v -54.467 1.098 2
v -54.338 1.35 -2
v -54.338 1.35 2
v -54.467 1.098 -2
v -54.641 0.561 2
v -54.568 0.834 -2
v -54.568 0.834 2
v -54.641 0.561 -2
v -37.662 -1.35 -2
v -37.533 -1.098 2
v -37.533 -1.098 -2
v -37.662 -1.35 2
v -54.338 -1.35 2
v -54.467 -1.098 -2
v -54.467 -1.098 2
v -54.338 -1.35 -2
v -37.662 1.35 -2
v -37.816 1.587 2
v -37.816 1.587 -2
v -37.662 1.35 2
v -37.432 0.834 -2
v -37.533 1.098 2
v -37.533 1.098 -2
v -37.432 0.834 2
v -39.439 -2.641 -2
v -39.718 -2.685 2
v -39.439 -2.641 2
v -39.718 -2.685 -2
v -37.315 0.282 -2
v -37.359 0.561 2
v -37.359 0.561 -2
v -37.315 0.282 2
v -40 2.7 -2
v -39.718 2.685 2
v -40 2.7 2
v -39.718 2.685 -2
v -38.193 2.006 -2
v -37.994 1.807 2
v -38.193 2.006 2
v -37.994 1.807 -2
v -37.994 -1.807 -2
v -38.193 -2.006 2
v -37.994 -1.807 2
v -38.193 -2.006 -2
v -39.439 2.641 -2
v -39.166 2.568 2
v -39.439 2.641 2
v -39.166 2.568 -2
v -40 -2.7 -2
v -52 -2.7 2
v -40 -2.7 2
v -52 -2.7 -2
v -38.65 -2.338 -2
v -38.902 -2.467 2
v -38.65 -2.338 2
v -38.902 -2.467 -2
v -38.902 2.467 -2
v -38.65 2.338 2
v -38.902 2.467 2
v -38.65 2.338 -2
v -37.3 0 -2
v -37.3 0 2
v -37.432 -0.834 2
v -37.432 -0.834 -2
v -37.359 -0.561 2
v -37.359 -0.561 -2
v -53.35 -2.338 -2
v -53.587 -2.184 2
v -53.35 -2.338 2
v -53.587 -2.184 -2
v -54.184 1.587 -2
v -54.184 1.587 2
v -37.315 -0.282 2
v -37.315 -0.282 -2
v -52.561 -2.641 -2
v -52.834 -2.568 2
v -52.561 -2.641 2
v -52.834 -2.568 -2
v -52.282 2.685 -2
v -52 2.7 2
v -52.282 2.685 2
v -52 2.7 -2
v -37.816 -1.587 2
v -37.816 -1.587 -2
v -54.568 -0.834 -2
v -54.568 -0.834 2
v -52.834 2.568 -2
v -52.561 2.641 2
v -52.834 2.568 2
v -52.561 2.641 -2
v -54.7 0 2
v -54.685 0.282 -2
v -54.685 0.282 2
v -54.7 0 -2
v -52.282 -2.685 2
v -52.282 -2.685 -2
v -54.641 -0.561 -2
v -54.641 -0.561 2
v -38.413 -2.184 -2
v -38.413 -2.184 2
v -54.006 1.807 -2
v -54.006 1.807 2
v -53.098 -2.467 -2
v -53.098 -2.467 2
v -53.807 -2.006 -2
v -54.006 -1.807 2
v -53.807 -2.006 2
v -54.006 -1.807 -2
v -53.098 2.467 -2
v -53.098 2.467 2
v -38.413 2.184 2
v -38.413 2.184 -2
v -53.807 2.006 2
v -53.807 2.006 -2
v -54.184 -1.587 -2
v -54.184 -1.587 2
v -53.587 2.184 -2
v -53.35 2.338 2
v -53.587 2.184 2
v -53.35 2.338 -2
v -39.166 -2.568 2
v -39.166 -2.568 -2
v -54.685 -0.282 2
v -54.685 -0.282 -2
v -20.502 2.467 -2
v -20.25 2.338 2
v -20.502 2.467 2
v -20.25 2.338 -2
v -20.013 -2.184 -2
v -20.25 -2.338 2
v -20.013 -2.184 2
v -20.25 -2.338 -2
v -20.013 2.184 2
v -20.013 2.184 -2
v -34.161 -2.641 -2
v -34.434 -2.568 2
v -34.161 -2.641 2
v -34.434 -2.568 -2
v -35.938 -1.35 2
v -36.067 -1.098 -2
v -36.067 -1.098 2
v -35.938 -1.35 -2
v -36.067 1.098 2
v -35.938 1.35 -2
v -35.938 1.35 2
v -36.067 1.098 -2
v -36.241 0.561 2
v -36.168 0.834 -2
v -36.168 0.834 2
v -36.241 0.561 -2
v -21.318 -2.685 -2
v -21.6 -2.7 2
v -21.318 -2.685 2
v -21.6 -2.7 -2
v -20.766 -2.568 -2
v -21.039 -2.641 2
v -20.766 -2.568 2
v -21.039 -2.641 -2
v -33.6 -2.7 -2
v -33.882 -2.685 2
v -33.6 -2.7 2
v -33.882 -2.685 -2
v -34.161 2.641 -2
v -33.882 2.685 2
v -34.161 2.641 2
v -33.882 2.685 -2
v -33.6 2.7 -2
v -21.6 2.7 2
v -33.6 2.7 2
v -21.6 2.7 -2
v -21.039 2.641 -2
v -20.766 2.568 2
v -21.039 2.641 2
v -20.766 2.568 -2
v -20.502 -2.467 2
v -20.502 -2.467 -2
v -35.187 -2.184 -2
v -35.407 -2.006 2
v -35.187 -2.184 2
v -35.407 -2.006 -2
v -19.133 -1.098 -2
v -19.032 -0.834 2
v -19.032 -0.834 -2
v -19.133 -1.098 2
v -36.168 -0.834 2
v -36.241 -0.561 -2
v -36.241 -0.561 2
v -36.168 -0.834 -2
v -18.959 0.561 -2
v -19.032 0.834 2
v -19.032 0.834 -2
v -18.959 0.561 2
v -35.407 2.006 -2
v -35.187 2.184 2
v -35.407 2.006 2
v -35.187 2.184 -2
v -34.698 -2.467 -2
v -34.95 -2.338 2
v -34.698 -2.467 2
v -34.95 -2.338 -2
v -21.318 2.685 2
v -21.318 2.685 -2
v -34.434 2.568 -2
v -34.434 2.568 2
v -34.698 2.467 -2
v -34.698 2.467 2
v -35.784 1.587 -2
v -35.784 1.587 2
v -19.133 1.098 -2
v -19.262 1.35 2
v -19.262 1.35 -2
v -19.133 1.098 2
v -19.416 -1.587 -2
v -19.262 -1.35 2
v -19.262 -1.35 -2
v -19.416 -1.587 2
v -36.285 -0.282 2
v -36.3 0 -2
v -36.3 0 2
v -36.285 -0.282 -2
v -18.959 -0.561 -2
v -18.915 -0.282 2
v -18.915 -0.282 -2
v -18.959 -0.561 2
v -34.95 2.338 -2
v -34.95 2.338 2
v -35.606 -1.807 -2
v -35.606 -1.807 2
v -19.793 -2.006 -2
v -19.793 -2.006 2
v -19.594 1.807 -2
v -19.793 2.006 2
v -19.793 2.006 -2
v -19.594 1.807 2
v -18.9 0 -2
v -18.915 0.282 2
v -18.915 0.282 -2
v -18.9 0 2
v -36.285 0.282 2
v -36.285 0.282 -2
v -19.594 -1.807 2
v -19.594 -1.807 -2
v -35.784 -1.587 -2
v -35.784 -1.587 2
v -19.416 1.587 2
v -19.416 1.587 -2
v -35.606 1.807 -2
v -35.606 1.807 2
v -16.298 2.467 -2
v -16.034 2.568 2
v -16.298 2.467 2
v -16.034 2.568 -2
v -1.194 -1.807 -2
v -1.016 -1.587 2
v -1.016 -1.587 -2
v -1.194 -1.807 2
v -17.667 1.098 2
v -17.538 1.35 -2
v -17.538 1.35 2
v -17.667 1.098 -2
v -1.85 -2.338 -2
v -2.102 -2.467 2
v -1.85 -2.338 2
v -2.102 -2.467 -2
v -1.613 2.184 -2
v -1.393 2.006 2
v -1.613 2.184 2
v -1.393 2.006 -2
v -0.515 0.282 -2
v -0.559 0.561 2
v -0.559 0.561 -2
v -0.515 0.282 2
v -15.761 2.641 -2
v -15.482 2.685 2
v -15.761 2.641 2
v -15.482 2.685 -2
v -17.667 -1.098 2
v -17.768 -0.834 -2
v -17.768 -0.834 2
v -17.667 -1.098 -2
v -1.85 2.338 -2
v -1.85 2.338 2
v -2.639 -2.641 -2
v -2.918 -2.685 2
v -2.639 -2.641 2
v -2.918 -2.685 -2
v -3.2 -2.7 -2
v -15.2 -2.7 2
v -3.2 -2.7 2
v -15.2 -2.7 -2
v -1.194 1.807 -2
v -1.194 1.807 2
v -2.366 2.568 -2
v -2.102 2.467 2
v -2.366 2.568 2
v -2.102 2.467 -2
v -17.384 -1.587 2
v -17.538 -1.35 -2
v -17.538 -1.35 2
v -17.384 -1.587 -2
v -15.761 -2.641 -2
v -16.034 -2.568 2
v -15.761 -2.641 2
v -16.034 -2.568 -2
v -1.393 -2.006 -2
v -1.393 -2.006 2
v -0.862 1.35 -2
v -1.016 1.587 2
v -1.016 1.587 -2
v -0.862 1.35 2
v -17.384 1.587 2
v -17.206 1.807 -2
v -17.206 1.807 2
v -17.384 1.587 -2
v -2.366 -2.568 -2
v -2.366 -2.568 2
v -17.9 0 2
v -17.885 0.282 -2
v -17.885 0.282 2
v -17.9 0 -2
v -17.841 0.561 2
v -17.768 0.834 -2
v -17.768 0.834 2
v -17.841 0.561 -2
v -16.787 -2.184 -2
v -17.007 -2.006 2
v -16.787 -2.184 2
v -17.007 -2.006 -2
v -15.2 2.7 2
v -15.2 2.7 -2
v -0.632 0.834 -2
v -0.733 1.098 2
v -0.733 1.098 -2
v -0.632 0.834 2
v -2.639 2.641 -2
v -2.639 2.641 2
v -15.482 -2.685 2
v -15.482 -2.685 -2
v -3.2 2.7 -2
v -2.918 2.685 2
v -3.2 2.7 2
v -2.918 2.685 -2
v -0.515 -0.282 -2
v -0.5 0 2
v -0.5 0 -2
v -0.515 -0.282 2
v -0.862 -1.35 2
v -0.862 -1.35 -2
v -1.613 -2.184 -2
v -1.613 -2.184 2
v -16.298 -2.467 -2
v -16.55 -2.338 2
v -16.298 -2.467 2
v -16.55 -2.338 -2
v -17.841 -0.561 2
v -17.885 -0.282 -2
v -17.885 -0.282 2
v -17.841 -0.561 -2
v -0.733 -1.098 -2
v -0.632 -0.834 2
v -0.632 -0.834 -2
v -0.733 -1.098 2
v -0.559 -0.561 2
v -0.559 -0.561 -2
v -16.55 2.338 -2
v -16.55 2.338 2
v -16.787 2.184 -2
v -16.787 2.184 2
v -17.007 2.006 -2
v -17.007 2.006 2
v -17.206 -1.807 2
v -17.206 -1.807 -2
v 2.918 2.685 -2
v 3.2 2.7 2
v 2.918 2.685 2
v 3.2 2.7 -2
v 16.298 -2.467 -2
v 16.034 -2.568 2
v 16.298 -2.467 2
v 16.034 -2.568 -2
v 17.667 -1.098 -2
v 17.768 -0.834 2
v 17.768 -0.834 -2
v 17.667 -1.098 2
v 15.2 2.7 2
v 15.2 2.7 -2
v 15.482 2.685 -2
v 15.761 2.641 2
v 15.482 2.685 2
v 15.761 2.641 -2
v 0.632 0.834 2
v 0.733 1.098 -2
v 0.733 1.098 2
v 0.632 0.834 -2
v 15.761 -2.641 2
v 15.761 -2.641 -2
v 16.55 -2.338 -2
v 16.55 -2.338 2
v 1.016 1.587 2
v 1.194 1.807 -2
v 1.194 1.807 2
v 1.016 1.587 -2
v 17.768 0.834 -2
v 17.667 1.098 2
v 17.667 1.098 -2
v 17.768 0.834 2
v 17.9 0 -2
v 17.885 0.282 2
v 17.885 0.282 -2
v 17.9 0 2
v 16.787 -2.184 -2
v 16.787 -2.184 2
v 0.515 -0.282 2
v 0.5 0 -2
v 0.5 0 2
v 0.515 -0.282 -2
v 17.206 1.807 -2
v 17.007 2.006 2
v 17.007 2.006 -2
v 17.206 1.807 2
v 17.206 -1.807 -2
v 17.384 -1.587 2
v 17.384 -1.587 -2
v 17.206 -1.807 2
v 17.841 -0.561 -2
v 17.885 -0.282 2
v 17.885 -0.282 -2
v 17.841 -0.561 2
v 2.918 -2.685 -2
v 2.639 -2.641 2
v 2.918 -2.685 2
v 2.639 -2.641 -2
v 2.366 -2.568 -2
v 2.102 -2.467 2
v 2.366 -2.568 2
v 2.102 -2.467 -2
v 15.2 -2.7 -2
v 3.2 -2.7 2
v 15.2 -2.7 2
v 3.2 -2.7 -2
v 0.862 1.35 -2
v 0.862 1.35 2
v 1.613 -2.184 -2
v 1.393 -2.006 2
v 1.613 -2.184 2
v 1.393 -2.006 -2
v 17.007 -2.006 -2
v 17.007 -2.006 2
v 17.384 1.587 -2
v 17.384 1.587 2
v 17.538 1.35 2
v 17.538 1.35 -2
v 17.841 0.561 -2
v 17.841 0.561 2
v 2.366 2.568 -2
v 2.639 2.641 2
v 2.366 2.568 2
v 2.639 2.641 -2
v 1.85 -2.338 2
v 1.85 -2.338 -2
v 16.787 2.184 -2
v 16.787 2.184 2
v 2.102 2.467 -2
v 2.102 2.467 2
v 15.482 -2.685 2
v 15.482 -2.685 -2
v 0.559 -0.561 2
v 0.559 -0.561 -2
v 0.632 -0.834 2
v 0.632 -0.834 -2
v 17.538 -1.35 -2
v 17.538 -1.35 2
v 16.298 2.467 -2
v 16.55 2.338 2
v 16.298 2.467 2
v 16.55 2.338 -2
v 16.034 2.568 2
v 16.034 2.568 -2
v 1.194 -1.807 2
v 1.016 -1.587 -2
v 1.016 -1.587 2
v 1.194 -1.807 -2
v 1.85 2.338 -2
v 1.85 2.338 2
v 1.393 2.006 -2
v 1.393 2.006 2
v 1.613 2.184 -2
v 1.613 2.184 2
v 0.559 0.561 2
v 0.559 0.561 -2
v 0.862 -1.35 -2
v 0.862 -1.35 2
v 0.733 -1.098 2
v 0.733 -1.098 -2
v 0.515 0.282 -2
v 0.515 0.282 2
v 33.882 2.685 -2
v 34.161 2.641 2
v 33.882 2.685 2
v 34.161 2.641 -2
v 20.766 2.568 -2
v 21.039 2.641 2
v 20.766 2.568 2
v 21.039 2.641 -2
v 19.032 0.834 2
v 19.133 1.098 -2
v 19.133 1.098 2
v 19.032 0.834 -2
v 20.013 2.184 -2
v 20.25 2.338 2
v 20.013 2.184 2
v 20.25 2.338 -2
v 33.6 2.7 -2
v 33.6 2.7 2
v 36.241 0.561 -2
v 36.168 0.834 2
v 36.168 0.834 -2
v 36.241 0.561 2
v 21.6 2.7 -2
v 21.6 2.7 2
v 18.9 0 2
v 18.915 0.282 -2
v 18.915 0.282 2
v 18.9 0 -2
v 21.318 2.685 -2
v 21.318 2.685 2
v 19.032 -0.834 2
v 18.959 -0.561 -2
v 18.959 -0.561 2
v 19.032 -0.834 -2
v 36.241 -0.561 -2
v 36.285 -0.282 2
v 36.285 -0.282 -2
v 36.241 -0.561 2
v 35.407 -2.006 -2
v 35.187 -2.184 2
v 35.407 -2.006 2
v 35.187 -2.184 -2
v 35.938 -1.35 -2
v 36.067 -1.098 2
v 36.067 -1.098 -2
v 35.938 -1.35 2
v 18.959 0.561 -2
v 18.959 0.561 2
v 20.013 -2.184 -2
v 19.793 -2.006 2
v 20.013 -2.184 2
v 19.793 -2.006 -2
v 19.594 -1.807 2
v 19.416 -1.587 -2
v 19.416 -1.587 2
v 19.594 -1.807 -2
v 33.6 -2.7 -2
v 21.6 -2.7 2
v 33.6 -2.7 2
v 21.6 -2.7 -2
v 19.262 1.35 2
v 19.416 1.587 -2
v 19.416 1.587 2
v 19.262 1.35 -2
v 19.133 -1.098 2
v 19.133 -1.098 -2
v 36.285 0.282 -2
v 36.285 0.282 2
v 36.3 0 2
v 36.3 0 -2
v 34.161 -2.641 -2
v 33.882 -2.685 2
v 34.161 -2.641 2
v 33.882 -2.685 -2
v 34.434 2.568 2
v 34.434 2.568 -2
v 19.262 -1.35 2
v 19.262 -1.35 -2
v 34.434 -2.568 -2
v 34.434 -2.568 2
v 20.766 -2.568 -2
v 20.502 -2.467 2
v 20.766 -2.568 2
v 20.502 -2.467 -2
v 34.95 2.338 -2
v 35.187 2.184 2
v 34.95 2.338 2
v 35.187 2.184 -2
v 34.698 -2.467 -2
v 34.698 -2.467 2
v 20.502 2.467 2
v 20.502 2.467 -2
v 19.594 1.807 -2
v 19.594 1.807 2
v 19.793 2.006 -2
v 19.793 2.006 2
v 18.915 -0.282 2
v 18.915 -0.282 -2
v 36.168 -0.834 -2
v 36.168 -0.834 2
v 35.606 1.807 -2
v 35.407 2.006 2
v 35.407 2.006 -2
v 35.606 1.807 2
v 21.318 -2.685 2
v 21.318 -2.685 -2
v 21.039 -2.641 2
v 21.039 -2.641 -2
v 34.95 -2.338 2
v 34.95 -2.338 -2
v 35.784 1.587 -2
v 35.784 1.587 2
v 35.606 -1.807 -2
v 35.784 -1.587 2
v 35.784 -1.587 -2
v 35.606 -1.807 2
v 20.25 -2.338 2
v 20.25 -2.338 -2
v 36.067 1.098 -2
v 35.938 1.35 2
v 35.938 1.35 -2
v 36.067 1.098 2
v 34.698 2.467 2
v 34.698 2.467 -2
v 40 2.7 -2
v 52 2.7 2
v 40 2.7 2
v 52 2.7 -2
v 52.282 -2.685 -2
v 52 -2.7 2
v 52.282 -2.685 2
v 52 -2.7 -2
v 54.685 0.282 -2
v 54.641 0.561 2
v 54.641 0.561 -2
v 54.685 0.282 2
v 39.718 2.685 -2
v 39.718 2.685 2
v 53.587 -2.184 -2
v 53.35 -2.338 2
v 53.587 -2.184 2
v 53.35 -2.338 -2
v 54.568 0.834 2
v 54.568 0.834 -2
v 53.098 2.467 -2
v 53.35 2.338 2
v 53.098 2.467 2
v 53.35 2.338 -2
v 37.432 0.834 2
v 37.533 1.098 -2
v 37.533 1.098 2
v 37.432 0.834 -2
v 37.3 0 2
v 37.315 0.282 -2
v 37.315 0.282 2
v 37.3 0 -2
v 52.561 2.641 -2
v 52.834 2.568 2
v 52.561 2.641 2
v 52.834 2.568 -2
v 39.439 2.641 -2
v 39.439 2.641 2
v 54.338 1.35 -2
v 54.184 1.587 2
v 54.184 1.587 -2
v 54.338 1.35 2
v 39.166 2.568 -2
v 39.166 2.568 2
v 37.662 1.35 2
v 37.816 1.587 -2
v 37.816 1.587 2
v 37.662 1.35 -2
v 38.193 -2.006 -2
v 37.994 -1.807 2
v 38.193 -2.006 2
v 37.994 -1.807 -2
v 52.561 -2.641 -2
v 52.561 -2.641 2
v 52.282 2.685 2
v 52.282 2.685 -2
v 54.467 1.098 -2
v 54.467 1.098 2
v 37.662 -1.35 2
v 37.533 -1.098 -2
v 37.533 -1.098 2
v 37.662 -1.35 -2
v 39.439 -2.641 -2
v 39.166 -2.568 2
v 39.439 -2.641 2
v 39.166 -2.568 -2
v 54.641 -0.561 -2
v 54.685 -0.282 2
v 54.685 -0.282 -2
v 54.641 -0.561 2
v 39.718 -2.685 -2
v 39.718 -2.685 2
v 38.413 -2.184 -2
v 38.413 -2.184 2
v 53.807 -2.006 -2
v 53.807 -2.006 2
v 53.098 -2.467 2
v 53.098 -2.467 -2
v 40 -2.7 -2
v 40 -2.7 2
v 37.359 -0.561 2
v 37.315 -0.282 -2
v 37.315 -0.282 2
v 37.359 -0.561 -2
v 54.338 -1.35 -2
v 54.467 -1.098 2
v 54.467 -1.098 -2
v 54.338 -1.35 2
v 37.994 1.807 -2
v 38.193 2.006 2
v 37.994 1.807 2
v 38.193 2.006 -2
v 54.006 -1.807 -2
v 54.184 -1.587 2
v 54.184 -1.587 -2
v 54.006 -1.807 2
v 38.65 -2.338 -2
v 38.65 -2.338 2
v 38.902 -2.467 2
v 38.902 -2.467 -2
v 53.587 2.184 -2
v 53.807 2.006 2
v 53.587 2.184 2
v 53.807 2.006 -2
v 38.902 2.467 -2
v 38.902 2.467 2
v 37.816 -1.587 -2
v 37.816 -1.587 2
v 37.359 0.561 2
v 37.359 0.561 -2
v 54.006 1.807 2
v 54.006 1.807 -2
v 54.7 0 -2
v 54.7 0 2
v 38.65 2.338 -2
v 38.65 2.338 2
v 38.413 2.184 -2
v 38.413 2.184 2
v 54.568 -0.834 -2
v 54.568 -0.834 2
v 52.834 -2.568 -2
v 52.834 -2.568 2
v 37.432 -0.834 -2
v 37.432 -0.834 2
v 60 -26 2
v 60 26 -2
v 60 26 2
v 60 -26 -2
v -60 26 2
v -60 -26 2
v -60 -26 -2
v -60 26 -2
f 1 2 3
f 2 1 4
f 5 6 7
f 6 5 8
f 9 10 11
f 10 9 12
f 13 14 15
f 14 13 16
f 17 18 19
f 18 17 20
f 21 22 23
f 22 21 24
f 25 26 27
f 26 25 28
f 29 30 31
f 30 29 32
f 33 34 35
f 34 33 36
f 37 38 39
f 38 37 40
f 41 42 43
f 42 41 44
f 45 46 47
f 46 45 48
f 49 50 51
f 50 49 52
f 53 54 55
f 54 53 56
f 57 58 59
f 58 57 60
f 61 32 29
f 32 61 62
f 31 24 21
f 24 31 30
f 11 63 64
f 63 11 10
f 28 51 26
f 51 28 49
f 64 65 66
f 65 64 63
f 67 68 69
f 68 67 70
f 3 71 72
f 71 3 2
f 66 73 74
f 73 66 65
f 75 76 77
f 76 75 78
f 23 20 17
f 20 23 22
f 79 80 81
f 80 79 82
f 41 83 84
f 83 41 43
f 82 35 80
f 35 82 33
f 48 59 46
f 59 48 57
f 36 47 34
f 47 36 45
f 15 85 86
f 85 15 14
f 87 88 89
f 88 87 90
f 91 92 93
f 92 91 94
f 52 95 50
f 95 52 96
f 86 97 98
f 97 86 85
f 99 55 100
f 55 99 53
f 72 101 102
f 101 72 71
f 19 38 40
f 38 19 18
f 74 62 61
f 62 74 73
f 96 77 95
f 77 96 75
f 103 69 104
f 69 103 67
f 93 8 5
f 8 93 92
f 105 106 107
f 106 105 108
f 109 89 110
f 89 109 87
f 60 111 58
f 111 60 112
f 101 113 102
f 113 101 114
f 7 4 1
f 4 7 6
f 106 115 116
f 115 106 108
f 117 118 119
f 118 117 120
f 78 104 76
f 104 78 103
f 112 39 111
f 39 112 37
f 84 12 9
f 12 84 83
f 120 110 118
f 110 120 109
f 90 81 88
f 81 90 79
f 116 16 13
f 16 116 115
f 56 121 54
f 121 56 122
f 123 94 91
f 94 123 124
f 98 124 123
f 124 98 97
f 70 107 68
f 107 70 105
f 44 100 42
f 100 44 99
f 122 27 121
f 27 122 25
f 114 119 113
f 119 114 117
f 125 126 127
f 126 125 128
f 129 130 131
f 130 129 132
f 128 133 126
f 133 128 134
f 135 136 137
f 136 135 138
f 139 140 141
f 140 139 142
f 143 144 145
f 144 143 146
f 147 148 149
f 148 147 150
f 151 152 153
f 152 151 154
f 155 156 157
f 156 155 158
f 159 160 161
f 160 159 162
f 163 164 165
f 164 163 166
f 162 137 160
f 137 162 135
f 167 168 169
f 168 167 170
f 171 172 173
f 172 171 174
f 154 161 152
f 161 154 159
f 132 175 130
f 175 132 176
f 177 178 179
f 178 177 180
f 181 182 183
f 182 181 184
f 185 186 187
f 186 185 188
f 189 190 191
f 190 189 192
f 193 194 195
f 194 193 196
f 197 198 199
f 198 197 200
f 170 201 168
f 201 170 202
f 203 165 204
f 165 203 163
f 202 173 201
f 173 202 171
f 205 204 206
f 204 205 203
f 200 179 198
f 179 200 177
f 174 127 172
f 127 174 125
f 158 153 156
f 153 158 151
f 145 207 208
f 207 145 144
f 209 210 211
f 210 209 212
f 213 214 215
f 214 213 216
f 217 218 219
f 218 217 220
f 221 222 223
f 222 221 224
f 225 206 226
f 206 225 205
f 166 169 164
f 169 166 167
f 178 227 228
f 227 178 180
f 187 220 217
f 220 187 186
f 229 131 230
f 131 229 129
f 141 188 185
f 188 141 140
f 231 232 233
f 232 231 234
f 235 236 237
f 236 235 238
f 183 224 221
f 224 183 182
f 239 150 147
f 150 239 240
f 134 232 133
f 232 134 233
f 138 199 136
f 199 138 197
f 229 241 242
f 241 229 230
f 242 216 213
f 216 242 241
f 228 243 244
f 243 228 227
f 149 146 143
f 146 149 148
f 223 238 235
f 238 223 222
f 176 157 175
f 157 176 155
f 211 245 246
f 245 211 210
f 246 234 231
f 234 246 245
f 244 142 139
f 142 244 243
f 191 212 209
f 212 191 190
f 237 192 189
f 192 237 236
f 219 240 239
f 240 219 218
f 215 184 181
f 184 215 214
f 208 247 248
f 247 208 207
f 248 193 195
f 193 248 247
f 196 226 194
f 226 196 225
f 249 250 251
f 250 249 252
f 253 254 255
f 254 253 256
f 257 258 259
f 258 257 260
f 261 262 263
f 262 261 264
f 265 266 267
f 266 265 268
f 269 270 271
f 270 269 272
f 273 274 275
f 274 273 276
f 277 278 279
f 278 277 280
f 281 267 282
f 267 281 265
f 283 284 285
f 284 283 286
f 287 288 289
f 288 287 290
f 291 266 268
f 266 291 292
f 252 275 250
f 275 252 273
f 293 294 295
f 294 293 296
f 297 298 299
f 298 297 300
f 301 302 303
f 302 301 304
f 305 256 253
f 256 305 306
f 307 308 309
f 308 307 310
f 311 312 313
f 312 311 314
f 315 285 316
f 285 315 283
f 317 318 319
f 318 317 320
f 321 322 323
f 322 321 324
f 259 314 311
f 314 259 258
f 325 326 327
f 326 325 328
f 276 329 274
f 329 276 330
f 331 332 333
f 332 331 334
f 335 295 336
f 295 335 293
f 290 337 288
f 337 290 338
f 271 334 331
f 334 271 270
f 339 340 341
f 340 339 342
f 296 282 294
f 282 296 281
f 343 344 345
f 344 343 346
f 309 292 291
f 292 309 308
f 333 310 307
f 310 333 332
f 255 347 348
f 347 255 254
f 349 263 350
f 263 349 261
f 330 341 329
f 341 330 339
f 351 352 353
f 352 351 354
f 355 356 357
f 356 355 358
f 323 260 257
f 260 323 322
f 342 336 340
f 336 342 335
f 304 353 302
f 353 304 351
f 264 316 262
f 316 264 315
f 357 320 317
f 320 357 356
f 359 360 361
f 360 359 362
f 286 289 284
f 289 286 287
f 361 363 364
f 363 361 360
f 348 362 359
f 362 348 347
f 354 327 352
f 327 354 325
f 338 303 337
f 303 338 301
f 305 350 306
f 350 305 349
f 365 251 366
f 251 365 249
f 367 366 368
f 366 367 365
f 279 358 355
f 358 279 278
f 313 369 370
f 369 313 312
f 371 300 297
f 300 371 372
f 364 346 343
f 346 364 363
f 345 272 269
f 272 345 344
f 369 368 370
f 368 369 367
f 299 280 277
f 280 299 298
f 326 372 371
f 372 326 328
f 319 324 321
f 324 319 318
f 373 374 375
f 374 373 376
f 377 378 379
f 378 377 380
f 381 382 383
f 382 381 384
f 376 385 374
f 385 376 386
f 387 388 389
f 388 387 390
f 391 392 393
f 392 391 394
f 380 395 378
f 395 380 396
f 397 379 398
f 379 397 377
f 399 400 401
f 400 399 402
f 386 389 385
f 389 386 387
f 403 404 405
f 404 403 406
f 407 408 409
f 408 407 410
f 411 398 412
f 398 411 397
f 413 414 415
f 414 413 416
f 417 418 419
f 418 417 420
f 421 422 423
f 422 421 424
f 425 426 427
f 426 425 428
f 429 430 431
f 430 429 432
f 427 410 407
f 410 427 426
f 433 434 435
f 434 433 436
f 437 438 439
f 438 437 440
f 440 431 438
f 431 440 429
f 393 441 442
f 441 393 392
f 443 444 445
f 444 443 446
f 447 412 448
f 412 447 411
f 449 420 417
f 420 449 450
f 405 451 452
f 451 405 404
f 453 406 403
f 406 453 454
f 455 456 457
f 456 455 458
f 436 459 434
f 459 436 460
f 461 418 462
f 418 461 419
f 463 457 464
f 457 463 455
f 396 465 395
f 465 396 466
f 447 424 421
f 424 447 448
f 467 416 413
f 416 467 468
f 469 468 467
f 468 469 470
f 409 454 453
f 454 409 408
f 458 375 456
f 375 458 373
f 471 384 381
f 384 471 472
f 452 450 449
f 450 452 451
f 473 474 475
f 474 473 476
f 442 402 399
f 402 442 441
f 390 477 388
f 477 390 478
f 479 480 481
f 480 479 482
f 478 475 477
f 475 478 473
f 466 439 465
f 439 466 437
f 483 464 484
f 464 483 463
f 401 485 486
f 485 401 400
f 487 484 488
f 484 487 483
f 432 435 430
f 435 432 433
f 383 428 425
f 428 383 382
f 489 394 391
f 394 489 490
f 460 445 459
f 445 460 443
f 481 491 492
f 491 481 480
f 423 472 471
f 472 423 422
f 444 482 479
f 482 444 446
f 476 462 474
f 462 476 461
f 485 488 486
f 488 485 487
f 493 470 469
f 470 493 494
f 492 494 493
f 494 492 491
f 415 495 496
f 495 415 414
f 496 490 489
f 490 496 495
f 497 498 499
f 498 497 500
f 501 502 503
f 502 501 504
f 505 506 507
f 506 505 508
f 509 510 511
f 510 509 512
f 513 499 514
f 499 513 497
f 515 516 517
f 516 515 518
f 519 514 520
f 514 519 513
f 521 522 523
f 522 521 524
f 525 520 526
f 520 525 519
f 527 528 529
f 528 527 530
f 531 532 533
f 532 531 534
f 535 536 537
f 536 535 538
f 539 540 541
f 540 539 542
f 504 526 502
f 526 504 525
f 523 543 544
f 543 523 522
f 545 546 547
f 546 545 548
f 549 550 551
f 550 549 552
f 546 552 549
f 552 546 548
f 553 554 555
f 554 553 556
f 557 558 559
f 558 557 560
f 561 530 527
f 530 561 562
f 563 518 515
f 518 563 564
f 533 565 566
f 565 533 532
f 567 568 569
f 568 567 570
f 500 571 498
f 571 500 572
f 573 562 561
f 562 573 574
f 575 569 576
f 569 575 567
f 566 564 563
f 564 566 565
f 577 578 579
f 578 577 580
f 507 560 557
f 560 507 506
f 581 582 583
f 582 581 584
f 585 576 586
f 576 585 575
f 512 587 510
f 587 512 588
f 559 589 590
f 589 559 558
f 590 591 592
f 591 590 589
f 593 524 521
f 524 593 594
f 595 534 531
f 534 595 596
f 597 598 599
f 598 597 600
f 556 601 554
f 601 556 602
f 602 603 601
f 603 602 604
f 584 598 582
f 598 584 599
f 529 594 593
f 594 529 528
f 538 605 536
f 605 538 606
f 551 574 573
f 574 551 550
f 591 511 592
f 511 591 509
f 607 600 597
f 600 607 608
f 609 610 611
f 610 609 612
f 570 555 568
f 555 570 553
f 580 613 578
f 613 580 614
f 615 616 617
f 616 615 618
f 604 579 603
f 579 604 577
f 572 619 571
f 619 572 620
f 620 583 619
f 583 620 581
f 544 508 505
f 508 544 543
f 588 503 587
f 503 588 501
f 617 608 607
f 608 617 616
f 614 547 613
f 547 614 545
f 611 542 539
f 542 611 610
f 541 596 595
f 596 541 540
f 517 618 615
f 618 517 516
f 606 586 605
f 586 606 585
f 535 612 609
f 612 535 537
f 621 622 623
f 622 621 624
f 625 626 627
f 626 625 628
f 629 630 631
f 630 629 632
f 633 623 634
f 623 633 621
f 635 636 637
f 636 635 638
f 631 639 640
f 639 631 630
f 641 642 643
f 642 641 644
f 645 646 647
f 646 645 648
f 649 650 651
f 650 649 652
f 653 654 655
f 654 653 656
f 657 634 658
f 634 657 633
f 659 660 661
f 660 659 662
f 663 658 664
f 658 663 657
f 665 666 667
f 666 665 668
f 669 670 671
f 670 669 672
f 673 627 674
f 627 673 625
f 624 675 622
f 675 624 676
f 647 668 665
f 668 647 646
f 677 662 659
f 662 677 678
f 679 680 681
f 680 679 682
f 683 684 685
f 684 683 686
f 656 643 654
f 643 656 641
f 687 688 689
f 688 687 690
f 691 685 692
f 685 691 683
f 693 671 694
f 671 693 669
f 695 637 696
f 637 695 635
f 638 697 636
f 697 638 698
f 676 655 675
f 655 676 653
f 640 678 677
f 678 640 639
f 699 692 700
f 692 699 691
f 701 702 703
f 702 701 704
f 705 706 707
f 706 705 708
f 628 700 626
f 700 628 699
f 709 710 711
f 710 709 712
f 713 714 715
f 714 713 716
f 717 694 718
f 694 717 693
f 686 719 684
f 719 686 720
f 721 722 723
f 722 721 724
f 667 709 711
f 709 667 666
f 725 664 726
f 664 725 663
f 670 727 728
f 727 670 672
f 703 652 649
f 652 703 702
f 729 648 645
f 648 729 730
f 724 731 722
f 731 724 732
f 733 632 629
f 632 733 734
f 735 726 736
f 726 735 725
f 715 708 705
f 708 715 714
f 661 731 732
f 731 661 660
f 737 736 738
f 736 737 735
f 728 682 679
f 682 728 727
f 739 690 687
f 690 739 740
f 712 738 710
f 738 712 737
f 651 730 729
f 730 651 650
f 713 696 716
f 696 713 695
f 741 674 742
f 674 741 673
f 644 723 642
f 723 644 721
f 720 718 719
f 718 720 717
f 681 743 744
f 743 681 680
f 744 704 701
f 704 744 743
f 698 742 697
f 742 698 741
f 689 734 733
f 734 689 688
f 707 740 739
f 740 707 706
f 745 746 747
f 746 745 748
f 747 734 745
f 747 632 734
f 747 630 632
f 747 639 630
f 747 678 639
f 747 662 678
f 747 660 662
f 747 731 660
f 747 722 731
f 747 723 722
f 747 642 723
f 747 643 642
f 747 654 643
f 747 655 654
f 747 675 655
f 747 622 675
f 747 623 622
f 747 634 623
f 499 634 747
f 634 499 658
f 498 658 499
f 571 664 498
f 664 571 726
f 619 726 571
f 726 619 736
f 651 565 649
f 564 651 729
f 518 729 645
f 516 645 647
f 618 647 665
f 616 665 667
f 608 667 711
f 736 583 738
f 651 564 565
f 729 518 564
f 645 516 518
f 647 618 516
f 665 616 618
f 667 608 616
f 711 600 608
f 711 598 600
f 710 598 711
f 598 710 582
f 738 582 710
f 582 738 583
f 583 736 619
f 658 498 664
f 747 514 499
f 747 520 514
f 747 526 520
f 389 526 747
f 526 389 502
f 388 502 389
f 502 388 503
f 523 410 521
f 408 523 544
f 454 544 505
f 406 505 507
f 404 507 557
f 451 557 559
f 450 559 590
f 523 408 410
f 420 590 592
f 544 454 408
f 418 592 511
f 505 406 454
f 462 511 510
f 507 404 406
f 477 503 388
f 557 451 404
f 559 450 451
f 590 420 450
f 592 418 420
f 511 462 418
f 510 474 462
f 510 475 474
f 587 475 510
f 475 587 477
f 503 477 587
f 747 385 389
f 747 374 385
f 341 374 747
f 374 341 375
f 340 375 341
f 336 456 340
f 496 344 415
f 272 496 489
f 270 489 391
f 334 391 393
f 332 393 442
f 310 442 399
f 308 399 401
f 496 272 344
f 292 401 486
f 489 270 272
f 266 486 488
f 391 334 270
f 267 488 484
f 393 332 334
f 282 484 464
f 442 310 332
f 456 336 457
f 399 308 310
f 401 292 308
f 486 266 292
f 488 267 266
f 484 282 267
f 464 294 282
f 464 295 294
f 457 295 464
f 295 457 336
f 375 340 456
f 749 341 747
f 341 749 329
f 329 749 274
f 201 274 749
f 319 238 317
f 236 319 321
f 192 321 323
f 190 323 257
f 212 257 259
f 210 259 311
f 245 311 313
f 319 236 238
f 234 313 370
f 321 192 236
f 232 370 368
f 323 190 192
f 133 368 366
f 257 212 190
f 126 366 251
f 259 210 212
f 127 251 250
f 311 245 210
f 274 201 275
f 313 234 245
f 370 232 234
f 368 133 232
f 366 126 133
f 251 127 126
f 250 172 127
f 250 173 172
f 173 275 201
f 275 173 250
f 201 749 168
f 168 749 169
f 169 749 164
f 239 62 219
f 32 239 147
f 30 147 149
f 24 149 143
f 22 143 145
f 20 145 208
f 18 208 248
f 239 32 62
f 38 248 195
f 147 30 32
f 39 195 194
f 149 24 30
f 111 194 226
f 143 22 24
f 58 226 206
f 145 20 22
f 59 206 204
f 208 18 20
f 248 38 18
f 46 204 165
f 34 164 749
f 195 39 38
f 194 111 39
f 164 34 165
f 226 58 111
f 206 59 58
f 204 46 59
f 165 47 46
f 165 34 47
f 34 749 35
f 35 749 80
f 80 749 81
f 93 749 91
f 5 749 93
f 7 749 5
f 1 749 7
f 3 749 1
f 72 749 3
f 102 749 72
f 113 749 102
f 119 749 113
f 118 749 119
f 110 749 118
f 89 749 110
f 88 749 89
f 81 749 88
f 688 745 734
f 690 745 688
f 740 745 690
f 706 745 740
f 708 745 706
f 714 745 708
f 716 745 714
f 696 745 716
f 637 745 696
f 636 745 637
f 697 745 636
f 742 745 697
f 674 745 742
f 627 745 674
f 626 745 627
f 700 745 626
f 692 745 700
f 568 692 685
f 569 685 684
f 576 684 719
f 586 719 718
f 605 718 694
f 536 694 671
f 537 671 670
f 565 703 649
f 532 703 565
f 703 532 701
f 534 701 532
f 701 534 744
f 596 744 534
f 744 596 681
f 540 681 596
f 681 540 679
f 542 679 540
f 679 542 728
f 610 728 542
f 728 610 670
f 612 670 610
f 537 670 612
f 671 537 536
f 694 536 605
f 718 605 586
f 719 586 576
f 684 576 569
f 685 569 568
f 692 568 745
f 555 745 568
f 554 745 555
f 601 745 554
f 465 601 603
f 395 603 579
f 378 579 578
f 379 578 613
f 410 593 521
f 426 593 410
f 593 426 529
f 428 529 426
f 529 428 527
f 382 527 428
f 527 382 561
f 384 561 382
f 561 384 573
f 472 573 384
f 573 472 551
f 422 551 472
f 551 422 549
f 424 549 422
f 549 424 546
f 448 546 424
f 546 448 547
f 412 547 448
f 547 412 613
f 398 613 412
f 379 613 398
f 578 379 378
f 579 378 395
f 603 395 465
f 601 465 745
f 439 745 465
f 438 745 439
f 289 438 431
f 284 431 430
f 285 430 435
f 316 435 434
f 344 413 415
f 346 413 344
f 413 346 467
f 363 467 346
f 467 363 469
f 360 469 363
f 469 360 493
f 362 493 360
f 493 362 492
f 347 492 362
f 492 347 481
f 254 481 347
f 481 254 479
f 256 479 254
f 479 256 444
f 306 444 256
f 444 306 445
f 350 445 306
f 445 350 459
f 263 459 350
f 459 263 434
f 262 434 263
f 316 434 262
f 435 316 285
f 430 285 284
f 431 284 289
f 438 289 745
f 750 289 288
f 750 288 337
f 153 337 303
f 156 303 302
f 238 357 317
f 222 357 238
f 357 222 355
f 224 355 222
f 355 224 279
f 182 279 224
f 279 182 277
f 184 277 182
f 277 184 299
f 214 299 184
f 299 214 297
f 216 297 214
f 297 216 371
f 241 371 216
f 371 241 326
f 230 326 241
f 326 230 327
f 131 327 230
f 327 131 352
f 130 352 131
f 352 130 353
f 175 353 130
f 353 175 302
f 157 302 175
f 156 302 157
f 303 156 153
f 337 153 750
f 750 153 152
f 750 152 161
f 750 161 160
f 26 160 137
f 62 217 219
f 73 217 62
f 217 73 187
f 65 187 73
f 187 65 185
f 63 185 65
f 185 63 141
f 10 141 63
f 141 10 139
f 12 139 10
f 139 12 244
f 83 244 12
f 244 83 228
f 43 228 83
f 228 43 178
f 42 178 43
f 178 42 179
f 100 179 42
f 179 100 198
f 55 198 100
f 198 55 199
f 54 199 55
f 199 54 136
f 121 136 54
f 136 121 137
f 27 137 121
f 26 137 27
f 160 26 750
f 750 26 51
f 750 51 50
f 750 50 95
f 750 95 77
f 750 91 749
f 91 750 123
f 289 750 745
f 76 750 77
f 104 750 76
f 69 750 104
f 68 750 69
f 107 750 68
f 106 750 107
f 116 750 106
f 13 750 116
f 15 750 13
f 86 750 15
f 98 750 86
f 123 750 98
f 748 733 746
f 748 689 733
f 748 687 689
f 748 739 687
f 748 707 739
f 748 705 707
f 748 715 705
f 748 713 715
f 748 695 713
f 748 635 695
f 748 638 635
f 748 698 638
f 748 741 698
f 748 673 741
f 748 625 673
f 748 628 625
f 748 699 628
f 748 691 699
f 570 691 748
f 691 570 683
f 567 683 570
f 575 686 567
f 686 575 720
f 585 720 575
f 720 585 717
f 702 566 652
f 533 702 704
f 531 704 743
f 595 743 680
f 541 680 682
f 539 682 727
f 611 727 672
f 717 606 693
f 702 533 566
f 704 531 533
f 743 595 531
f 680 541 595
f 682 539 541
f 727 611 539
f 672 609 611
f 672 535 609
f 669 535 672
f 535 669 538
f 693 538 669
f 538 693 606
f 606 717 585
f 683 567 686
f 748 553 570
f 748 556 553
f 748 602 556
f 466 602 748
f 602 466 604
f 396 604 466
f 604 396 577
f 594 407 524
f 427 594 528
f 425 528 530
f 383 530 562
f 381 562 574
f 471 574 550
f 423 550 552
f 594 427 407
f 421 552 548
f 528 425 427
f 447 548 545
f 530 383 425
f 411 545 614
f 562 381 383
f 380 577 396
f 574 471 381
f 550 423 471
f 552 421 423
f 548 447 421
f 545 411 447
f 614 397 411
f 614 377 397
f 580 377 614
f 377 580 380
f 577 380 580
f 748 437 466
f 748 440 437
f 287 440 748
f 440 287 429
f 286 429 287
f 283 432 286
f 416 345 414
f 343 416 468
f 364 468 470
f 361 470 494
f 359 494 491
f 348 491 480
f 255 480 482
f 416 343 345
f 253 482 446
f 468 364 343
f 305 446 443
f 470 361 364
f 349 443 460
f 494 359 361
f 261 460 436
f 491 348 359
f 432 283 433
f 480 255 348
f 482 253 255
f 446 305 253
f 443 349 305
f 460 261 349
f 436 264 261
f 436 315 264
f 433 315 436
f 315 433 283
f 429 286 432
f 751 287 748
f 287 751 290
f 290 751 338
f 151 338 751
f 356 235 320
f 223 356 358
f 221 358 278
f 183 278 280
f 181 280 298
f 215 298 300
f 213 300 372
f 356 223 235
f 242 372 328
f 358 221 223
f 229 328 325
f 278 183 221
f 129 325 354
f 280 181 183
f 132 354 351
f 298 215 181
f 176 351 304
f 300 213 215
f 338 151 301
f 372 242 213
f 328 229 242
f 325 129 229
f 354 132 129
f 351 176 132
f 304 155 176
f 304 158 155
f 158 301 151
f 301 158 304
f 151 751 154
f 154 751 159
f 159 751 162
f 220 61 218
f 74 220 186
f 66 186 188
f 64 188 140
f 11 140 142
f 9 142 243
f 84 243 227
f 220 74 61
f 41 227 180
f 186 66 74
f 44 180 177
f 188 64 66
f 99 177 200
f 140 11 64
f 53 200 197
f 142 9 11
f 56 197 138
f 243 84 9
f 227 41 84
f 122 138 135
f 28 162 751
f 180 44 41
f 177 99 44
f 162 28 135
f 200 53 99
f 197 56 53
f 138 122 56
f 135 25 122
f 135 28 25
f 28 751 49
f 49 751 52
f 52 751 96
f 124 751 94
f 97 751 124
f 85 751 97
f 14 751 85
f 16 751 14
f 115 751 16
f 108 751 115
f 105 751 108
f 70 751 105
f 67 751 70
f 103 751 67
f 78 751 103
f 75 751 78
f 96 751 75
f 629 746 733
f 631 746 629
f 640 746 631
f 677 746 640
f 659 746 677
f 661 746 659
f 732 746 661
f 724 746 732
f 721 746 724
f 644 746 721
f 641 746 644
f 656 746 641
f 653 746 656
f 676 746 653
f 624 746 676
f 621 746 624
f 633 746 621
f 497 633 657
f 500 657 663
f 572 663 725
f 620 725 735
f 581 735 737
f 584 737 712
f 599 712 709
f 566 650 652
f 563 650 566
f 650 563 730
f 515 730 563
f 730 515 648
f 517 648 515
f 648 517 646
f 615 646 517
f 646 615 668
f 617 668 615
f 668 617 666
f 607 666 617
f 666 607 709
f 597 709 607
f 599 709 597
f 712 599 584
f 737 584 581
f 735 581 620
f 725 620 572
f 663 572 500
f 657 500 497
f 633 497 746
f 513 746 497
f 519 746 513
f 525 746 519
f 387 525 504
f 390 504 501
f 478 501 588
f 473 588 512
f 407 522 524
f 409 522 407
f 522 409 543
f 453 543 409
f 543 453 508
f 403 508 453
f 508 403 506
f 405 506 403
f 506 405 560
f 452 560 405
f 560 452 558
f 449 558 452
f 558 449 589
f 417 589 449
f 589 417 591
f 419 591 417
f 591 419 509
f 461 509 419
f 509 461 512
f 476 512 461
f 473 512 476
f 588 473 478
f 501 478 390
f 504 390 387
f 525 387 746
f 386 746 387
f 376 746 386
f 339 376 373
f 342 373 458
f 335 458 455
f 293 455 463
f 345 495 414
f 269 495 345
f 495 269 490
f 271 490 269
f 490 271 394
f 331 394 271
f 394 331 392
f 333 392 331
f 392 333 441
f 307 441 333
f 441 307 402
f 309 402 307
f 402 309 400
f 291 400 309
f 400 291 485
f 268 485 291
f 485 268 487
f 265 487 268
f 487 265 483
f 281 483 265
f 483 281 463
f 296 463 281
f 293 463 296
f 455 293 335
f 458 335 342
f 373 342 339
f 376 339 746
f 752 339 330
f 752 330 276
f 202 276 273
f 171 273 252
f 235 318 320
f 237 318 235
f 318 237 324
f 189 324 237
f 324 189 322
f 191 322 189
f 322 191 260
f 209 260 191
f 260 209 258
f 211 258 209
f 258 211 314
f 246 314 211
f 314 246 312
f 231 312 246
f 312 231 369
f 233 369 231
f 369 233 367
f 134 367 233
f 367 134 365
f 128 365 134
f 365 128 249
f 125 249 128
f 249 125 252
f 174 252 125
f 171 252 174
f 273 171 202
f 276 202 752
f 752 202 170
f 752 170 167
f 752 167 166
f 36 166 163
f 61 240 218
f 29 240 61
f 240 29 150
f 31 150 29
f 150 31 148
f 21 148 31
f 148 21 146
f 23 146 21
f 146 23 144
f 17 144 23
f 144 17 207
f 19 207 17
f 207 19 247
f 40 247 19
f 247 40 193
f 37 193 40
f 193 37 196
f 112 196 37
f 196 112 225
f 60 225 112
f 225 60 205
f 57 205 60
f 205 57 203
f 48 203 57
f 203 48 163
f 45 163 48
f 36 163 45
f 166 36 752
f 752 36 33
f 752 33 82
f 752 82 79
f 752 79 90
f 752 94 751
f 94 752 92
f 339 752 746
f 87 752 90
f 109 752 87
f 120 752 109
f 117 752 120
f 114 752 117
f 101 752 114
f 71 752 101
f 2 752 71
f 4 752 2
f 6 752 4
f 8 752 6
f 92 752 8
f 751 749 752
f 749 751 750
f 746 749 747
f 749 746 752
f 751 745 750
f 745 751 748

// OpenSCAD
// Slotted mounting plate.
$fn = 60;
eps = 0.02;
plate_l = 120;
plate_w = 52;
plate_t = 4;
slot_l = 12;
module slot(x) { hull() { translate([x-slot_l/2,0,-plate_t/2-eps]) cylinder(d=5.4,h=plate_t+2*eps); translate([x+slot_l/2,0,-plate_t/2-eps]) cylinder(d=5.4,h=plate_t+2*eps); } }
difference() { cube([plate_l,plate_w,plate_t],center=true); for(i=[0:5]) slot(-plate_l/2+14+i*(plate_l-28)/max(1,5)); }
